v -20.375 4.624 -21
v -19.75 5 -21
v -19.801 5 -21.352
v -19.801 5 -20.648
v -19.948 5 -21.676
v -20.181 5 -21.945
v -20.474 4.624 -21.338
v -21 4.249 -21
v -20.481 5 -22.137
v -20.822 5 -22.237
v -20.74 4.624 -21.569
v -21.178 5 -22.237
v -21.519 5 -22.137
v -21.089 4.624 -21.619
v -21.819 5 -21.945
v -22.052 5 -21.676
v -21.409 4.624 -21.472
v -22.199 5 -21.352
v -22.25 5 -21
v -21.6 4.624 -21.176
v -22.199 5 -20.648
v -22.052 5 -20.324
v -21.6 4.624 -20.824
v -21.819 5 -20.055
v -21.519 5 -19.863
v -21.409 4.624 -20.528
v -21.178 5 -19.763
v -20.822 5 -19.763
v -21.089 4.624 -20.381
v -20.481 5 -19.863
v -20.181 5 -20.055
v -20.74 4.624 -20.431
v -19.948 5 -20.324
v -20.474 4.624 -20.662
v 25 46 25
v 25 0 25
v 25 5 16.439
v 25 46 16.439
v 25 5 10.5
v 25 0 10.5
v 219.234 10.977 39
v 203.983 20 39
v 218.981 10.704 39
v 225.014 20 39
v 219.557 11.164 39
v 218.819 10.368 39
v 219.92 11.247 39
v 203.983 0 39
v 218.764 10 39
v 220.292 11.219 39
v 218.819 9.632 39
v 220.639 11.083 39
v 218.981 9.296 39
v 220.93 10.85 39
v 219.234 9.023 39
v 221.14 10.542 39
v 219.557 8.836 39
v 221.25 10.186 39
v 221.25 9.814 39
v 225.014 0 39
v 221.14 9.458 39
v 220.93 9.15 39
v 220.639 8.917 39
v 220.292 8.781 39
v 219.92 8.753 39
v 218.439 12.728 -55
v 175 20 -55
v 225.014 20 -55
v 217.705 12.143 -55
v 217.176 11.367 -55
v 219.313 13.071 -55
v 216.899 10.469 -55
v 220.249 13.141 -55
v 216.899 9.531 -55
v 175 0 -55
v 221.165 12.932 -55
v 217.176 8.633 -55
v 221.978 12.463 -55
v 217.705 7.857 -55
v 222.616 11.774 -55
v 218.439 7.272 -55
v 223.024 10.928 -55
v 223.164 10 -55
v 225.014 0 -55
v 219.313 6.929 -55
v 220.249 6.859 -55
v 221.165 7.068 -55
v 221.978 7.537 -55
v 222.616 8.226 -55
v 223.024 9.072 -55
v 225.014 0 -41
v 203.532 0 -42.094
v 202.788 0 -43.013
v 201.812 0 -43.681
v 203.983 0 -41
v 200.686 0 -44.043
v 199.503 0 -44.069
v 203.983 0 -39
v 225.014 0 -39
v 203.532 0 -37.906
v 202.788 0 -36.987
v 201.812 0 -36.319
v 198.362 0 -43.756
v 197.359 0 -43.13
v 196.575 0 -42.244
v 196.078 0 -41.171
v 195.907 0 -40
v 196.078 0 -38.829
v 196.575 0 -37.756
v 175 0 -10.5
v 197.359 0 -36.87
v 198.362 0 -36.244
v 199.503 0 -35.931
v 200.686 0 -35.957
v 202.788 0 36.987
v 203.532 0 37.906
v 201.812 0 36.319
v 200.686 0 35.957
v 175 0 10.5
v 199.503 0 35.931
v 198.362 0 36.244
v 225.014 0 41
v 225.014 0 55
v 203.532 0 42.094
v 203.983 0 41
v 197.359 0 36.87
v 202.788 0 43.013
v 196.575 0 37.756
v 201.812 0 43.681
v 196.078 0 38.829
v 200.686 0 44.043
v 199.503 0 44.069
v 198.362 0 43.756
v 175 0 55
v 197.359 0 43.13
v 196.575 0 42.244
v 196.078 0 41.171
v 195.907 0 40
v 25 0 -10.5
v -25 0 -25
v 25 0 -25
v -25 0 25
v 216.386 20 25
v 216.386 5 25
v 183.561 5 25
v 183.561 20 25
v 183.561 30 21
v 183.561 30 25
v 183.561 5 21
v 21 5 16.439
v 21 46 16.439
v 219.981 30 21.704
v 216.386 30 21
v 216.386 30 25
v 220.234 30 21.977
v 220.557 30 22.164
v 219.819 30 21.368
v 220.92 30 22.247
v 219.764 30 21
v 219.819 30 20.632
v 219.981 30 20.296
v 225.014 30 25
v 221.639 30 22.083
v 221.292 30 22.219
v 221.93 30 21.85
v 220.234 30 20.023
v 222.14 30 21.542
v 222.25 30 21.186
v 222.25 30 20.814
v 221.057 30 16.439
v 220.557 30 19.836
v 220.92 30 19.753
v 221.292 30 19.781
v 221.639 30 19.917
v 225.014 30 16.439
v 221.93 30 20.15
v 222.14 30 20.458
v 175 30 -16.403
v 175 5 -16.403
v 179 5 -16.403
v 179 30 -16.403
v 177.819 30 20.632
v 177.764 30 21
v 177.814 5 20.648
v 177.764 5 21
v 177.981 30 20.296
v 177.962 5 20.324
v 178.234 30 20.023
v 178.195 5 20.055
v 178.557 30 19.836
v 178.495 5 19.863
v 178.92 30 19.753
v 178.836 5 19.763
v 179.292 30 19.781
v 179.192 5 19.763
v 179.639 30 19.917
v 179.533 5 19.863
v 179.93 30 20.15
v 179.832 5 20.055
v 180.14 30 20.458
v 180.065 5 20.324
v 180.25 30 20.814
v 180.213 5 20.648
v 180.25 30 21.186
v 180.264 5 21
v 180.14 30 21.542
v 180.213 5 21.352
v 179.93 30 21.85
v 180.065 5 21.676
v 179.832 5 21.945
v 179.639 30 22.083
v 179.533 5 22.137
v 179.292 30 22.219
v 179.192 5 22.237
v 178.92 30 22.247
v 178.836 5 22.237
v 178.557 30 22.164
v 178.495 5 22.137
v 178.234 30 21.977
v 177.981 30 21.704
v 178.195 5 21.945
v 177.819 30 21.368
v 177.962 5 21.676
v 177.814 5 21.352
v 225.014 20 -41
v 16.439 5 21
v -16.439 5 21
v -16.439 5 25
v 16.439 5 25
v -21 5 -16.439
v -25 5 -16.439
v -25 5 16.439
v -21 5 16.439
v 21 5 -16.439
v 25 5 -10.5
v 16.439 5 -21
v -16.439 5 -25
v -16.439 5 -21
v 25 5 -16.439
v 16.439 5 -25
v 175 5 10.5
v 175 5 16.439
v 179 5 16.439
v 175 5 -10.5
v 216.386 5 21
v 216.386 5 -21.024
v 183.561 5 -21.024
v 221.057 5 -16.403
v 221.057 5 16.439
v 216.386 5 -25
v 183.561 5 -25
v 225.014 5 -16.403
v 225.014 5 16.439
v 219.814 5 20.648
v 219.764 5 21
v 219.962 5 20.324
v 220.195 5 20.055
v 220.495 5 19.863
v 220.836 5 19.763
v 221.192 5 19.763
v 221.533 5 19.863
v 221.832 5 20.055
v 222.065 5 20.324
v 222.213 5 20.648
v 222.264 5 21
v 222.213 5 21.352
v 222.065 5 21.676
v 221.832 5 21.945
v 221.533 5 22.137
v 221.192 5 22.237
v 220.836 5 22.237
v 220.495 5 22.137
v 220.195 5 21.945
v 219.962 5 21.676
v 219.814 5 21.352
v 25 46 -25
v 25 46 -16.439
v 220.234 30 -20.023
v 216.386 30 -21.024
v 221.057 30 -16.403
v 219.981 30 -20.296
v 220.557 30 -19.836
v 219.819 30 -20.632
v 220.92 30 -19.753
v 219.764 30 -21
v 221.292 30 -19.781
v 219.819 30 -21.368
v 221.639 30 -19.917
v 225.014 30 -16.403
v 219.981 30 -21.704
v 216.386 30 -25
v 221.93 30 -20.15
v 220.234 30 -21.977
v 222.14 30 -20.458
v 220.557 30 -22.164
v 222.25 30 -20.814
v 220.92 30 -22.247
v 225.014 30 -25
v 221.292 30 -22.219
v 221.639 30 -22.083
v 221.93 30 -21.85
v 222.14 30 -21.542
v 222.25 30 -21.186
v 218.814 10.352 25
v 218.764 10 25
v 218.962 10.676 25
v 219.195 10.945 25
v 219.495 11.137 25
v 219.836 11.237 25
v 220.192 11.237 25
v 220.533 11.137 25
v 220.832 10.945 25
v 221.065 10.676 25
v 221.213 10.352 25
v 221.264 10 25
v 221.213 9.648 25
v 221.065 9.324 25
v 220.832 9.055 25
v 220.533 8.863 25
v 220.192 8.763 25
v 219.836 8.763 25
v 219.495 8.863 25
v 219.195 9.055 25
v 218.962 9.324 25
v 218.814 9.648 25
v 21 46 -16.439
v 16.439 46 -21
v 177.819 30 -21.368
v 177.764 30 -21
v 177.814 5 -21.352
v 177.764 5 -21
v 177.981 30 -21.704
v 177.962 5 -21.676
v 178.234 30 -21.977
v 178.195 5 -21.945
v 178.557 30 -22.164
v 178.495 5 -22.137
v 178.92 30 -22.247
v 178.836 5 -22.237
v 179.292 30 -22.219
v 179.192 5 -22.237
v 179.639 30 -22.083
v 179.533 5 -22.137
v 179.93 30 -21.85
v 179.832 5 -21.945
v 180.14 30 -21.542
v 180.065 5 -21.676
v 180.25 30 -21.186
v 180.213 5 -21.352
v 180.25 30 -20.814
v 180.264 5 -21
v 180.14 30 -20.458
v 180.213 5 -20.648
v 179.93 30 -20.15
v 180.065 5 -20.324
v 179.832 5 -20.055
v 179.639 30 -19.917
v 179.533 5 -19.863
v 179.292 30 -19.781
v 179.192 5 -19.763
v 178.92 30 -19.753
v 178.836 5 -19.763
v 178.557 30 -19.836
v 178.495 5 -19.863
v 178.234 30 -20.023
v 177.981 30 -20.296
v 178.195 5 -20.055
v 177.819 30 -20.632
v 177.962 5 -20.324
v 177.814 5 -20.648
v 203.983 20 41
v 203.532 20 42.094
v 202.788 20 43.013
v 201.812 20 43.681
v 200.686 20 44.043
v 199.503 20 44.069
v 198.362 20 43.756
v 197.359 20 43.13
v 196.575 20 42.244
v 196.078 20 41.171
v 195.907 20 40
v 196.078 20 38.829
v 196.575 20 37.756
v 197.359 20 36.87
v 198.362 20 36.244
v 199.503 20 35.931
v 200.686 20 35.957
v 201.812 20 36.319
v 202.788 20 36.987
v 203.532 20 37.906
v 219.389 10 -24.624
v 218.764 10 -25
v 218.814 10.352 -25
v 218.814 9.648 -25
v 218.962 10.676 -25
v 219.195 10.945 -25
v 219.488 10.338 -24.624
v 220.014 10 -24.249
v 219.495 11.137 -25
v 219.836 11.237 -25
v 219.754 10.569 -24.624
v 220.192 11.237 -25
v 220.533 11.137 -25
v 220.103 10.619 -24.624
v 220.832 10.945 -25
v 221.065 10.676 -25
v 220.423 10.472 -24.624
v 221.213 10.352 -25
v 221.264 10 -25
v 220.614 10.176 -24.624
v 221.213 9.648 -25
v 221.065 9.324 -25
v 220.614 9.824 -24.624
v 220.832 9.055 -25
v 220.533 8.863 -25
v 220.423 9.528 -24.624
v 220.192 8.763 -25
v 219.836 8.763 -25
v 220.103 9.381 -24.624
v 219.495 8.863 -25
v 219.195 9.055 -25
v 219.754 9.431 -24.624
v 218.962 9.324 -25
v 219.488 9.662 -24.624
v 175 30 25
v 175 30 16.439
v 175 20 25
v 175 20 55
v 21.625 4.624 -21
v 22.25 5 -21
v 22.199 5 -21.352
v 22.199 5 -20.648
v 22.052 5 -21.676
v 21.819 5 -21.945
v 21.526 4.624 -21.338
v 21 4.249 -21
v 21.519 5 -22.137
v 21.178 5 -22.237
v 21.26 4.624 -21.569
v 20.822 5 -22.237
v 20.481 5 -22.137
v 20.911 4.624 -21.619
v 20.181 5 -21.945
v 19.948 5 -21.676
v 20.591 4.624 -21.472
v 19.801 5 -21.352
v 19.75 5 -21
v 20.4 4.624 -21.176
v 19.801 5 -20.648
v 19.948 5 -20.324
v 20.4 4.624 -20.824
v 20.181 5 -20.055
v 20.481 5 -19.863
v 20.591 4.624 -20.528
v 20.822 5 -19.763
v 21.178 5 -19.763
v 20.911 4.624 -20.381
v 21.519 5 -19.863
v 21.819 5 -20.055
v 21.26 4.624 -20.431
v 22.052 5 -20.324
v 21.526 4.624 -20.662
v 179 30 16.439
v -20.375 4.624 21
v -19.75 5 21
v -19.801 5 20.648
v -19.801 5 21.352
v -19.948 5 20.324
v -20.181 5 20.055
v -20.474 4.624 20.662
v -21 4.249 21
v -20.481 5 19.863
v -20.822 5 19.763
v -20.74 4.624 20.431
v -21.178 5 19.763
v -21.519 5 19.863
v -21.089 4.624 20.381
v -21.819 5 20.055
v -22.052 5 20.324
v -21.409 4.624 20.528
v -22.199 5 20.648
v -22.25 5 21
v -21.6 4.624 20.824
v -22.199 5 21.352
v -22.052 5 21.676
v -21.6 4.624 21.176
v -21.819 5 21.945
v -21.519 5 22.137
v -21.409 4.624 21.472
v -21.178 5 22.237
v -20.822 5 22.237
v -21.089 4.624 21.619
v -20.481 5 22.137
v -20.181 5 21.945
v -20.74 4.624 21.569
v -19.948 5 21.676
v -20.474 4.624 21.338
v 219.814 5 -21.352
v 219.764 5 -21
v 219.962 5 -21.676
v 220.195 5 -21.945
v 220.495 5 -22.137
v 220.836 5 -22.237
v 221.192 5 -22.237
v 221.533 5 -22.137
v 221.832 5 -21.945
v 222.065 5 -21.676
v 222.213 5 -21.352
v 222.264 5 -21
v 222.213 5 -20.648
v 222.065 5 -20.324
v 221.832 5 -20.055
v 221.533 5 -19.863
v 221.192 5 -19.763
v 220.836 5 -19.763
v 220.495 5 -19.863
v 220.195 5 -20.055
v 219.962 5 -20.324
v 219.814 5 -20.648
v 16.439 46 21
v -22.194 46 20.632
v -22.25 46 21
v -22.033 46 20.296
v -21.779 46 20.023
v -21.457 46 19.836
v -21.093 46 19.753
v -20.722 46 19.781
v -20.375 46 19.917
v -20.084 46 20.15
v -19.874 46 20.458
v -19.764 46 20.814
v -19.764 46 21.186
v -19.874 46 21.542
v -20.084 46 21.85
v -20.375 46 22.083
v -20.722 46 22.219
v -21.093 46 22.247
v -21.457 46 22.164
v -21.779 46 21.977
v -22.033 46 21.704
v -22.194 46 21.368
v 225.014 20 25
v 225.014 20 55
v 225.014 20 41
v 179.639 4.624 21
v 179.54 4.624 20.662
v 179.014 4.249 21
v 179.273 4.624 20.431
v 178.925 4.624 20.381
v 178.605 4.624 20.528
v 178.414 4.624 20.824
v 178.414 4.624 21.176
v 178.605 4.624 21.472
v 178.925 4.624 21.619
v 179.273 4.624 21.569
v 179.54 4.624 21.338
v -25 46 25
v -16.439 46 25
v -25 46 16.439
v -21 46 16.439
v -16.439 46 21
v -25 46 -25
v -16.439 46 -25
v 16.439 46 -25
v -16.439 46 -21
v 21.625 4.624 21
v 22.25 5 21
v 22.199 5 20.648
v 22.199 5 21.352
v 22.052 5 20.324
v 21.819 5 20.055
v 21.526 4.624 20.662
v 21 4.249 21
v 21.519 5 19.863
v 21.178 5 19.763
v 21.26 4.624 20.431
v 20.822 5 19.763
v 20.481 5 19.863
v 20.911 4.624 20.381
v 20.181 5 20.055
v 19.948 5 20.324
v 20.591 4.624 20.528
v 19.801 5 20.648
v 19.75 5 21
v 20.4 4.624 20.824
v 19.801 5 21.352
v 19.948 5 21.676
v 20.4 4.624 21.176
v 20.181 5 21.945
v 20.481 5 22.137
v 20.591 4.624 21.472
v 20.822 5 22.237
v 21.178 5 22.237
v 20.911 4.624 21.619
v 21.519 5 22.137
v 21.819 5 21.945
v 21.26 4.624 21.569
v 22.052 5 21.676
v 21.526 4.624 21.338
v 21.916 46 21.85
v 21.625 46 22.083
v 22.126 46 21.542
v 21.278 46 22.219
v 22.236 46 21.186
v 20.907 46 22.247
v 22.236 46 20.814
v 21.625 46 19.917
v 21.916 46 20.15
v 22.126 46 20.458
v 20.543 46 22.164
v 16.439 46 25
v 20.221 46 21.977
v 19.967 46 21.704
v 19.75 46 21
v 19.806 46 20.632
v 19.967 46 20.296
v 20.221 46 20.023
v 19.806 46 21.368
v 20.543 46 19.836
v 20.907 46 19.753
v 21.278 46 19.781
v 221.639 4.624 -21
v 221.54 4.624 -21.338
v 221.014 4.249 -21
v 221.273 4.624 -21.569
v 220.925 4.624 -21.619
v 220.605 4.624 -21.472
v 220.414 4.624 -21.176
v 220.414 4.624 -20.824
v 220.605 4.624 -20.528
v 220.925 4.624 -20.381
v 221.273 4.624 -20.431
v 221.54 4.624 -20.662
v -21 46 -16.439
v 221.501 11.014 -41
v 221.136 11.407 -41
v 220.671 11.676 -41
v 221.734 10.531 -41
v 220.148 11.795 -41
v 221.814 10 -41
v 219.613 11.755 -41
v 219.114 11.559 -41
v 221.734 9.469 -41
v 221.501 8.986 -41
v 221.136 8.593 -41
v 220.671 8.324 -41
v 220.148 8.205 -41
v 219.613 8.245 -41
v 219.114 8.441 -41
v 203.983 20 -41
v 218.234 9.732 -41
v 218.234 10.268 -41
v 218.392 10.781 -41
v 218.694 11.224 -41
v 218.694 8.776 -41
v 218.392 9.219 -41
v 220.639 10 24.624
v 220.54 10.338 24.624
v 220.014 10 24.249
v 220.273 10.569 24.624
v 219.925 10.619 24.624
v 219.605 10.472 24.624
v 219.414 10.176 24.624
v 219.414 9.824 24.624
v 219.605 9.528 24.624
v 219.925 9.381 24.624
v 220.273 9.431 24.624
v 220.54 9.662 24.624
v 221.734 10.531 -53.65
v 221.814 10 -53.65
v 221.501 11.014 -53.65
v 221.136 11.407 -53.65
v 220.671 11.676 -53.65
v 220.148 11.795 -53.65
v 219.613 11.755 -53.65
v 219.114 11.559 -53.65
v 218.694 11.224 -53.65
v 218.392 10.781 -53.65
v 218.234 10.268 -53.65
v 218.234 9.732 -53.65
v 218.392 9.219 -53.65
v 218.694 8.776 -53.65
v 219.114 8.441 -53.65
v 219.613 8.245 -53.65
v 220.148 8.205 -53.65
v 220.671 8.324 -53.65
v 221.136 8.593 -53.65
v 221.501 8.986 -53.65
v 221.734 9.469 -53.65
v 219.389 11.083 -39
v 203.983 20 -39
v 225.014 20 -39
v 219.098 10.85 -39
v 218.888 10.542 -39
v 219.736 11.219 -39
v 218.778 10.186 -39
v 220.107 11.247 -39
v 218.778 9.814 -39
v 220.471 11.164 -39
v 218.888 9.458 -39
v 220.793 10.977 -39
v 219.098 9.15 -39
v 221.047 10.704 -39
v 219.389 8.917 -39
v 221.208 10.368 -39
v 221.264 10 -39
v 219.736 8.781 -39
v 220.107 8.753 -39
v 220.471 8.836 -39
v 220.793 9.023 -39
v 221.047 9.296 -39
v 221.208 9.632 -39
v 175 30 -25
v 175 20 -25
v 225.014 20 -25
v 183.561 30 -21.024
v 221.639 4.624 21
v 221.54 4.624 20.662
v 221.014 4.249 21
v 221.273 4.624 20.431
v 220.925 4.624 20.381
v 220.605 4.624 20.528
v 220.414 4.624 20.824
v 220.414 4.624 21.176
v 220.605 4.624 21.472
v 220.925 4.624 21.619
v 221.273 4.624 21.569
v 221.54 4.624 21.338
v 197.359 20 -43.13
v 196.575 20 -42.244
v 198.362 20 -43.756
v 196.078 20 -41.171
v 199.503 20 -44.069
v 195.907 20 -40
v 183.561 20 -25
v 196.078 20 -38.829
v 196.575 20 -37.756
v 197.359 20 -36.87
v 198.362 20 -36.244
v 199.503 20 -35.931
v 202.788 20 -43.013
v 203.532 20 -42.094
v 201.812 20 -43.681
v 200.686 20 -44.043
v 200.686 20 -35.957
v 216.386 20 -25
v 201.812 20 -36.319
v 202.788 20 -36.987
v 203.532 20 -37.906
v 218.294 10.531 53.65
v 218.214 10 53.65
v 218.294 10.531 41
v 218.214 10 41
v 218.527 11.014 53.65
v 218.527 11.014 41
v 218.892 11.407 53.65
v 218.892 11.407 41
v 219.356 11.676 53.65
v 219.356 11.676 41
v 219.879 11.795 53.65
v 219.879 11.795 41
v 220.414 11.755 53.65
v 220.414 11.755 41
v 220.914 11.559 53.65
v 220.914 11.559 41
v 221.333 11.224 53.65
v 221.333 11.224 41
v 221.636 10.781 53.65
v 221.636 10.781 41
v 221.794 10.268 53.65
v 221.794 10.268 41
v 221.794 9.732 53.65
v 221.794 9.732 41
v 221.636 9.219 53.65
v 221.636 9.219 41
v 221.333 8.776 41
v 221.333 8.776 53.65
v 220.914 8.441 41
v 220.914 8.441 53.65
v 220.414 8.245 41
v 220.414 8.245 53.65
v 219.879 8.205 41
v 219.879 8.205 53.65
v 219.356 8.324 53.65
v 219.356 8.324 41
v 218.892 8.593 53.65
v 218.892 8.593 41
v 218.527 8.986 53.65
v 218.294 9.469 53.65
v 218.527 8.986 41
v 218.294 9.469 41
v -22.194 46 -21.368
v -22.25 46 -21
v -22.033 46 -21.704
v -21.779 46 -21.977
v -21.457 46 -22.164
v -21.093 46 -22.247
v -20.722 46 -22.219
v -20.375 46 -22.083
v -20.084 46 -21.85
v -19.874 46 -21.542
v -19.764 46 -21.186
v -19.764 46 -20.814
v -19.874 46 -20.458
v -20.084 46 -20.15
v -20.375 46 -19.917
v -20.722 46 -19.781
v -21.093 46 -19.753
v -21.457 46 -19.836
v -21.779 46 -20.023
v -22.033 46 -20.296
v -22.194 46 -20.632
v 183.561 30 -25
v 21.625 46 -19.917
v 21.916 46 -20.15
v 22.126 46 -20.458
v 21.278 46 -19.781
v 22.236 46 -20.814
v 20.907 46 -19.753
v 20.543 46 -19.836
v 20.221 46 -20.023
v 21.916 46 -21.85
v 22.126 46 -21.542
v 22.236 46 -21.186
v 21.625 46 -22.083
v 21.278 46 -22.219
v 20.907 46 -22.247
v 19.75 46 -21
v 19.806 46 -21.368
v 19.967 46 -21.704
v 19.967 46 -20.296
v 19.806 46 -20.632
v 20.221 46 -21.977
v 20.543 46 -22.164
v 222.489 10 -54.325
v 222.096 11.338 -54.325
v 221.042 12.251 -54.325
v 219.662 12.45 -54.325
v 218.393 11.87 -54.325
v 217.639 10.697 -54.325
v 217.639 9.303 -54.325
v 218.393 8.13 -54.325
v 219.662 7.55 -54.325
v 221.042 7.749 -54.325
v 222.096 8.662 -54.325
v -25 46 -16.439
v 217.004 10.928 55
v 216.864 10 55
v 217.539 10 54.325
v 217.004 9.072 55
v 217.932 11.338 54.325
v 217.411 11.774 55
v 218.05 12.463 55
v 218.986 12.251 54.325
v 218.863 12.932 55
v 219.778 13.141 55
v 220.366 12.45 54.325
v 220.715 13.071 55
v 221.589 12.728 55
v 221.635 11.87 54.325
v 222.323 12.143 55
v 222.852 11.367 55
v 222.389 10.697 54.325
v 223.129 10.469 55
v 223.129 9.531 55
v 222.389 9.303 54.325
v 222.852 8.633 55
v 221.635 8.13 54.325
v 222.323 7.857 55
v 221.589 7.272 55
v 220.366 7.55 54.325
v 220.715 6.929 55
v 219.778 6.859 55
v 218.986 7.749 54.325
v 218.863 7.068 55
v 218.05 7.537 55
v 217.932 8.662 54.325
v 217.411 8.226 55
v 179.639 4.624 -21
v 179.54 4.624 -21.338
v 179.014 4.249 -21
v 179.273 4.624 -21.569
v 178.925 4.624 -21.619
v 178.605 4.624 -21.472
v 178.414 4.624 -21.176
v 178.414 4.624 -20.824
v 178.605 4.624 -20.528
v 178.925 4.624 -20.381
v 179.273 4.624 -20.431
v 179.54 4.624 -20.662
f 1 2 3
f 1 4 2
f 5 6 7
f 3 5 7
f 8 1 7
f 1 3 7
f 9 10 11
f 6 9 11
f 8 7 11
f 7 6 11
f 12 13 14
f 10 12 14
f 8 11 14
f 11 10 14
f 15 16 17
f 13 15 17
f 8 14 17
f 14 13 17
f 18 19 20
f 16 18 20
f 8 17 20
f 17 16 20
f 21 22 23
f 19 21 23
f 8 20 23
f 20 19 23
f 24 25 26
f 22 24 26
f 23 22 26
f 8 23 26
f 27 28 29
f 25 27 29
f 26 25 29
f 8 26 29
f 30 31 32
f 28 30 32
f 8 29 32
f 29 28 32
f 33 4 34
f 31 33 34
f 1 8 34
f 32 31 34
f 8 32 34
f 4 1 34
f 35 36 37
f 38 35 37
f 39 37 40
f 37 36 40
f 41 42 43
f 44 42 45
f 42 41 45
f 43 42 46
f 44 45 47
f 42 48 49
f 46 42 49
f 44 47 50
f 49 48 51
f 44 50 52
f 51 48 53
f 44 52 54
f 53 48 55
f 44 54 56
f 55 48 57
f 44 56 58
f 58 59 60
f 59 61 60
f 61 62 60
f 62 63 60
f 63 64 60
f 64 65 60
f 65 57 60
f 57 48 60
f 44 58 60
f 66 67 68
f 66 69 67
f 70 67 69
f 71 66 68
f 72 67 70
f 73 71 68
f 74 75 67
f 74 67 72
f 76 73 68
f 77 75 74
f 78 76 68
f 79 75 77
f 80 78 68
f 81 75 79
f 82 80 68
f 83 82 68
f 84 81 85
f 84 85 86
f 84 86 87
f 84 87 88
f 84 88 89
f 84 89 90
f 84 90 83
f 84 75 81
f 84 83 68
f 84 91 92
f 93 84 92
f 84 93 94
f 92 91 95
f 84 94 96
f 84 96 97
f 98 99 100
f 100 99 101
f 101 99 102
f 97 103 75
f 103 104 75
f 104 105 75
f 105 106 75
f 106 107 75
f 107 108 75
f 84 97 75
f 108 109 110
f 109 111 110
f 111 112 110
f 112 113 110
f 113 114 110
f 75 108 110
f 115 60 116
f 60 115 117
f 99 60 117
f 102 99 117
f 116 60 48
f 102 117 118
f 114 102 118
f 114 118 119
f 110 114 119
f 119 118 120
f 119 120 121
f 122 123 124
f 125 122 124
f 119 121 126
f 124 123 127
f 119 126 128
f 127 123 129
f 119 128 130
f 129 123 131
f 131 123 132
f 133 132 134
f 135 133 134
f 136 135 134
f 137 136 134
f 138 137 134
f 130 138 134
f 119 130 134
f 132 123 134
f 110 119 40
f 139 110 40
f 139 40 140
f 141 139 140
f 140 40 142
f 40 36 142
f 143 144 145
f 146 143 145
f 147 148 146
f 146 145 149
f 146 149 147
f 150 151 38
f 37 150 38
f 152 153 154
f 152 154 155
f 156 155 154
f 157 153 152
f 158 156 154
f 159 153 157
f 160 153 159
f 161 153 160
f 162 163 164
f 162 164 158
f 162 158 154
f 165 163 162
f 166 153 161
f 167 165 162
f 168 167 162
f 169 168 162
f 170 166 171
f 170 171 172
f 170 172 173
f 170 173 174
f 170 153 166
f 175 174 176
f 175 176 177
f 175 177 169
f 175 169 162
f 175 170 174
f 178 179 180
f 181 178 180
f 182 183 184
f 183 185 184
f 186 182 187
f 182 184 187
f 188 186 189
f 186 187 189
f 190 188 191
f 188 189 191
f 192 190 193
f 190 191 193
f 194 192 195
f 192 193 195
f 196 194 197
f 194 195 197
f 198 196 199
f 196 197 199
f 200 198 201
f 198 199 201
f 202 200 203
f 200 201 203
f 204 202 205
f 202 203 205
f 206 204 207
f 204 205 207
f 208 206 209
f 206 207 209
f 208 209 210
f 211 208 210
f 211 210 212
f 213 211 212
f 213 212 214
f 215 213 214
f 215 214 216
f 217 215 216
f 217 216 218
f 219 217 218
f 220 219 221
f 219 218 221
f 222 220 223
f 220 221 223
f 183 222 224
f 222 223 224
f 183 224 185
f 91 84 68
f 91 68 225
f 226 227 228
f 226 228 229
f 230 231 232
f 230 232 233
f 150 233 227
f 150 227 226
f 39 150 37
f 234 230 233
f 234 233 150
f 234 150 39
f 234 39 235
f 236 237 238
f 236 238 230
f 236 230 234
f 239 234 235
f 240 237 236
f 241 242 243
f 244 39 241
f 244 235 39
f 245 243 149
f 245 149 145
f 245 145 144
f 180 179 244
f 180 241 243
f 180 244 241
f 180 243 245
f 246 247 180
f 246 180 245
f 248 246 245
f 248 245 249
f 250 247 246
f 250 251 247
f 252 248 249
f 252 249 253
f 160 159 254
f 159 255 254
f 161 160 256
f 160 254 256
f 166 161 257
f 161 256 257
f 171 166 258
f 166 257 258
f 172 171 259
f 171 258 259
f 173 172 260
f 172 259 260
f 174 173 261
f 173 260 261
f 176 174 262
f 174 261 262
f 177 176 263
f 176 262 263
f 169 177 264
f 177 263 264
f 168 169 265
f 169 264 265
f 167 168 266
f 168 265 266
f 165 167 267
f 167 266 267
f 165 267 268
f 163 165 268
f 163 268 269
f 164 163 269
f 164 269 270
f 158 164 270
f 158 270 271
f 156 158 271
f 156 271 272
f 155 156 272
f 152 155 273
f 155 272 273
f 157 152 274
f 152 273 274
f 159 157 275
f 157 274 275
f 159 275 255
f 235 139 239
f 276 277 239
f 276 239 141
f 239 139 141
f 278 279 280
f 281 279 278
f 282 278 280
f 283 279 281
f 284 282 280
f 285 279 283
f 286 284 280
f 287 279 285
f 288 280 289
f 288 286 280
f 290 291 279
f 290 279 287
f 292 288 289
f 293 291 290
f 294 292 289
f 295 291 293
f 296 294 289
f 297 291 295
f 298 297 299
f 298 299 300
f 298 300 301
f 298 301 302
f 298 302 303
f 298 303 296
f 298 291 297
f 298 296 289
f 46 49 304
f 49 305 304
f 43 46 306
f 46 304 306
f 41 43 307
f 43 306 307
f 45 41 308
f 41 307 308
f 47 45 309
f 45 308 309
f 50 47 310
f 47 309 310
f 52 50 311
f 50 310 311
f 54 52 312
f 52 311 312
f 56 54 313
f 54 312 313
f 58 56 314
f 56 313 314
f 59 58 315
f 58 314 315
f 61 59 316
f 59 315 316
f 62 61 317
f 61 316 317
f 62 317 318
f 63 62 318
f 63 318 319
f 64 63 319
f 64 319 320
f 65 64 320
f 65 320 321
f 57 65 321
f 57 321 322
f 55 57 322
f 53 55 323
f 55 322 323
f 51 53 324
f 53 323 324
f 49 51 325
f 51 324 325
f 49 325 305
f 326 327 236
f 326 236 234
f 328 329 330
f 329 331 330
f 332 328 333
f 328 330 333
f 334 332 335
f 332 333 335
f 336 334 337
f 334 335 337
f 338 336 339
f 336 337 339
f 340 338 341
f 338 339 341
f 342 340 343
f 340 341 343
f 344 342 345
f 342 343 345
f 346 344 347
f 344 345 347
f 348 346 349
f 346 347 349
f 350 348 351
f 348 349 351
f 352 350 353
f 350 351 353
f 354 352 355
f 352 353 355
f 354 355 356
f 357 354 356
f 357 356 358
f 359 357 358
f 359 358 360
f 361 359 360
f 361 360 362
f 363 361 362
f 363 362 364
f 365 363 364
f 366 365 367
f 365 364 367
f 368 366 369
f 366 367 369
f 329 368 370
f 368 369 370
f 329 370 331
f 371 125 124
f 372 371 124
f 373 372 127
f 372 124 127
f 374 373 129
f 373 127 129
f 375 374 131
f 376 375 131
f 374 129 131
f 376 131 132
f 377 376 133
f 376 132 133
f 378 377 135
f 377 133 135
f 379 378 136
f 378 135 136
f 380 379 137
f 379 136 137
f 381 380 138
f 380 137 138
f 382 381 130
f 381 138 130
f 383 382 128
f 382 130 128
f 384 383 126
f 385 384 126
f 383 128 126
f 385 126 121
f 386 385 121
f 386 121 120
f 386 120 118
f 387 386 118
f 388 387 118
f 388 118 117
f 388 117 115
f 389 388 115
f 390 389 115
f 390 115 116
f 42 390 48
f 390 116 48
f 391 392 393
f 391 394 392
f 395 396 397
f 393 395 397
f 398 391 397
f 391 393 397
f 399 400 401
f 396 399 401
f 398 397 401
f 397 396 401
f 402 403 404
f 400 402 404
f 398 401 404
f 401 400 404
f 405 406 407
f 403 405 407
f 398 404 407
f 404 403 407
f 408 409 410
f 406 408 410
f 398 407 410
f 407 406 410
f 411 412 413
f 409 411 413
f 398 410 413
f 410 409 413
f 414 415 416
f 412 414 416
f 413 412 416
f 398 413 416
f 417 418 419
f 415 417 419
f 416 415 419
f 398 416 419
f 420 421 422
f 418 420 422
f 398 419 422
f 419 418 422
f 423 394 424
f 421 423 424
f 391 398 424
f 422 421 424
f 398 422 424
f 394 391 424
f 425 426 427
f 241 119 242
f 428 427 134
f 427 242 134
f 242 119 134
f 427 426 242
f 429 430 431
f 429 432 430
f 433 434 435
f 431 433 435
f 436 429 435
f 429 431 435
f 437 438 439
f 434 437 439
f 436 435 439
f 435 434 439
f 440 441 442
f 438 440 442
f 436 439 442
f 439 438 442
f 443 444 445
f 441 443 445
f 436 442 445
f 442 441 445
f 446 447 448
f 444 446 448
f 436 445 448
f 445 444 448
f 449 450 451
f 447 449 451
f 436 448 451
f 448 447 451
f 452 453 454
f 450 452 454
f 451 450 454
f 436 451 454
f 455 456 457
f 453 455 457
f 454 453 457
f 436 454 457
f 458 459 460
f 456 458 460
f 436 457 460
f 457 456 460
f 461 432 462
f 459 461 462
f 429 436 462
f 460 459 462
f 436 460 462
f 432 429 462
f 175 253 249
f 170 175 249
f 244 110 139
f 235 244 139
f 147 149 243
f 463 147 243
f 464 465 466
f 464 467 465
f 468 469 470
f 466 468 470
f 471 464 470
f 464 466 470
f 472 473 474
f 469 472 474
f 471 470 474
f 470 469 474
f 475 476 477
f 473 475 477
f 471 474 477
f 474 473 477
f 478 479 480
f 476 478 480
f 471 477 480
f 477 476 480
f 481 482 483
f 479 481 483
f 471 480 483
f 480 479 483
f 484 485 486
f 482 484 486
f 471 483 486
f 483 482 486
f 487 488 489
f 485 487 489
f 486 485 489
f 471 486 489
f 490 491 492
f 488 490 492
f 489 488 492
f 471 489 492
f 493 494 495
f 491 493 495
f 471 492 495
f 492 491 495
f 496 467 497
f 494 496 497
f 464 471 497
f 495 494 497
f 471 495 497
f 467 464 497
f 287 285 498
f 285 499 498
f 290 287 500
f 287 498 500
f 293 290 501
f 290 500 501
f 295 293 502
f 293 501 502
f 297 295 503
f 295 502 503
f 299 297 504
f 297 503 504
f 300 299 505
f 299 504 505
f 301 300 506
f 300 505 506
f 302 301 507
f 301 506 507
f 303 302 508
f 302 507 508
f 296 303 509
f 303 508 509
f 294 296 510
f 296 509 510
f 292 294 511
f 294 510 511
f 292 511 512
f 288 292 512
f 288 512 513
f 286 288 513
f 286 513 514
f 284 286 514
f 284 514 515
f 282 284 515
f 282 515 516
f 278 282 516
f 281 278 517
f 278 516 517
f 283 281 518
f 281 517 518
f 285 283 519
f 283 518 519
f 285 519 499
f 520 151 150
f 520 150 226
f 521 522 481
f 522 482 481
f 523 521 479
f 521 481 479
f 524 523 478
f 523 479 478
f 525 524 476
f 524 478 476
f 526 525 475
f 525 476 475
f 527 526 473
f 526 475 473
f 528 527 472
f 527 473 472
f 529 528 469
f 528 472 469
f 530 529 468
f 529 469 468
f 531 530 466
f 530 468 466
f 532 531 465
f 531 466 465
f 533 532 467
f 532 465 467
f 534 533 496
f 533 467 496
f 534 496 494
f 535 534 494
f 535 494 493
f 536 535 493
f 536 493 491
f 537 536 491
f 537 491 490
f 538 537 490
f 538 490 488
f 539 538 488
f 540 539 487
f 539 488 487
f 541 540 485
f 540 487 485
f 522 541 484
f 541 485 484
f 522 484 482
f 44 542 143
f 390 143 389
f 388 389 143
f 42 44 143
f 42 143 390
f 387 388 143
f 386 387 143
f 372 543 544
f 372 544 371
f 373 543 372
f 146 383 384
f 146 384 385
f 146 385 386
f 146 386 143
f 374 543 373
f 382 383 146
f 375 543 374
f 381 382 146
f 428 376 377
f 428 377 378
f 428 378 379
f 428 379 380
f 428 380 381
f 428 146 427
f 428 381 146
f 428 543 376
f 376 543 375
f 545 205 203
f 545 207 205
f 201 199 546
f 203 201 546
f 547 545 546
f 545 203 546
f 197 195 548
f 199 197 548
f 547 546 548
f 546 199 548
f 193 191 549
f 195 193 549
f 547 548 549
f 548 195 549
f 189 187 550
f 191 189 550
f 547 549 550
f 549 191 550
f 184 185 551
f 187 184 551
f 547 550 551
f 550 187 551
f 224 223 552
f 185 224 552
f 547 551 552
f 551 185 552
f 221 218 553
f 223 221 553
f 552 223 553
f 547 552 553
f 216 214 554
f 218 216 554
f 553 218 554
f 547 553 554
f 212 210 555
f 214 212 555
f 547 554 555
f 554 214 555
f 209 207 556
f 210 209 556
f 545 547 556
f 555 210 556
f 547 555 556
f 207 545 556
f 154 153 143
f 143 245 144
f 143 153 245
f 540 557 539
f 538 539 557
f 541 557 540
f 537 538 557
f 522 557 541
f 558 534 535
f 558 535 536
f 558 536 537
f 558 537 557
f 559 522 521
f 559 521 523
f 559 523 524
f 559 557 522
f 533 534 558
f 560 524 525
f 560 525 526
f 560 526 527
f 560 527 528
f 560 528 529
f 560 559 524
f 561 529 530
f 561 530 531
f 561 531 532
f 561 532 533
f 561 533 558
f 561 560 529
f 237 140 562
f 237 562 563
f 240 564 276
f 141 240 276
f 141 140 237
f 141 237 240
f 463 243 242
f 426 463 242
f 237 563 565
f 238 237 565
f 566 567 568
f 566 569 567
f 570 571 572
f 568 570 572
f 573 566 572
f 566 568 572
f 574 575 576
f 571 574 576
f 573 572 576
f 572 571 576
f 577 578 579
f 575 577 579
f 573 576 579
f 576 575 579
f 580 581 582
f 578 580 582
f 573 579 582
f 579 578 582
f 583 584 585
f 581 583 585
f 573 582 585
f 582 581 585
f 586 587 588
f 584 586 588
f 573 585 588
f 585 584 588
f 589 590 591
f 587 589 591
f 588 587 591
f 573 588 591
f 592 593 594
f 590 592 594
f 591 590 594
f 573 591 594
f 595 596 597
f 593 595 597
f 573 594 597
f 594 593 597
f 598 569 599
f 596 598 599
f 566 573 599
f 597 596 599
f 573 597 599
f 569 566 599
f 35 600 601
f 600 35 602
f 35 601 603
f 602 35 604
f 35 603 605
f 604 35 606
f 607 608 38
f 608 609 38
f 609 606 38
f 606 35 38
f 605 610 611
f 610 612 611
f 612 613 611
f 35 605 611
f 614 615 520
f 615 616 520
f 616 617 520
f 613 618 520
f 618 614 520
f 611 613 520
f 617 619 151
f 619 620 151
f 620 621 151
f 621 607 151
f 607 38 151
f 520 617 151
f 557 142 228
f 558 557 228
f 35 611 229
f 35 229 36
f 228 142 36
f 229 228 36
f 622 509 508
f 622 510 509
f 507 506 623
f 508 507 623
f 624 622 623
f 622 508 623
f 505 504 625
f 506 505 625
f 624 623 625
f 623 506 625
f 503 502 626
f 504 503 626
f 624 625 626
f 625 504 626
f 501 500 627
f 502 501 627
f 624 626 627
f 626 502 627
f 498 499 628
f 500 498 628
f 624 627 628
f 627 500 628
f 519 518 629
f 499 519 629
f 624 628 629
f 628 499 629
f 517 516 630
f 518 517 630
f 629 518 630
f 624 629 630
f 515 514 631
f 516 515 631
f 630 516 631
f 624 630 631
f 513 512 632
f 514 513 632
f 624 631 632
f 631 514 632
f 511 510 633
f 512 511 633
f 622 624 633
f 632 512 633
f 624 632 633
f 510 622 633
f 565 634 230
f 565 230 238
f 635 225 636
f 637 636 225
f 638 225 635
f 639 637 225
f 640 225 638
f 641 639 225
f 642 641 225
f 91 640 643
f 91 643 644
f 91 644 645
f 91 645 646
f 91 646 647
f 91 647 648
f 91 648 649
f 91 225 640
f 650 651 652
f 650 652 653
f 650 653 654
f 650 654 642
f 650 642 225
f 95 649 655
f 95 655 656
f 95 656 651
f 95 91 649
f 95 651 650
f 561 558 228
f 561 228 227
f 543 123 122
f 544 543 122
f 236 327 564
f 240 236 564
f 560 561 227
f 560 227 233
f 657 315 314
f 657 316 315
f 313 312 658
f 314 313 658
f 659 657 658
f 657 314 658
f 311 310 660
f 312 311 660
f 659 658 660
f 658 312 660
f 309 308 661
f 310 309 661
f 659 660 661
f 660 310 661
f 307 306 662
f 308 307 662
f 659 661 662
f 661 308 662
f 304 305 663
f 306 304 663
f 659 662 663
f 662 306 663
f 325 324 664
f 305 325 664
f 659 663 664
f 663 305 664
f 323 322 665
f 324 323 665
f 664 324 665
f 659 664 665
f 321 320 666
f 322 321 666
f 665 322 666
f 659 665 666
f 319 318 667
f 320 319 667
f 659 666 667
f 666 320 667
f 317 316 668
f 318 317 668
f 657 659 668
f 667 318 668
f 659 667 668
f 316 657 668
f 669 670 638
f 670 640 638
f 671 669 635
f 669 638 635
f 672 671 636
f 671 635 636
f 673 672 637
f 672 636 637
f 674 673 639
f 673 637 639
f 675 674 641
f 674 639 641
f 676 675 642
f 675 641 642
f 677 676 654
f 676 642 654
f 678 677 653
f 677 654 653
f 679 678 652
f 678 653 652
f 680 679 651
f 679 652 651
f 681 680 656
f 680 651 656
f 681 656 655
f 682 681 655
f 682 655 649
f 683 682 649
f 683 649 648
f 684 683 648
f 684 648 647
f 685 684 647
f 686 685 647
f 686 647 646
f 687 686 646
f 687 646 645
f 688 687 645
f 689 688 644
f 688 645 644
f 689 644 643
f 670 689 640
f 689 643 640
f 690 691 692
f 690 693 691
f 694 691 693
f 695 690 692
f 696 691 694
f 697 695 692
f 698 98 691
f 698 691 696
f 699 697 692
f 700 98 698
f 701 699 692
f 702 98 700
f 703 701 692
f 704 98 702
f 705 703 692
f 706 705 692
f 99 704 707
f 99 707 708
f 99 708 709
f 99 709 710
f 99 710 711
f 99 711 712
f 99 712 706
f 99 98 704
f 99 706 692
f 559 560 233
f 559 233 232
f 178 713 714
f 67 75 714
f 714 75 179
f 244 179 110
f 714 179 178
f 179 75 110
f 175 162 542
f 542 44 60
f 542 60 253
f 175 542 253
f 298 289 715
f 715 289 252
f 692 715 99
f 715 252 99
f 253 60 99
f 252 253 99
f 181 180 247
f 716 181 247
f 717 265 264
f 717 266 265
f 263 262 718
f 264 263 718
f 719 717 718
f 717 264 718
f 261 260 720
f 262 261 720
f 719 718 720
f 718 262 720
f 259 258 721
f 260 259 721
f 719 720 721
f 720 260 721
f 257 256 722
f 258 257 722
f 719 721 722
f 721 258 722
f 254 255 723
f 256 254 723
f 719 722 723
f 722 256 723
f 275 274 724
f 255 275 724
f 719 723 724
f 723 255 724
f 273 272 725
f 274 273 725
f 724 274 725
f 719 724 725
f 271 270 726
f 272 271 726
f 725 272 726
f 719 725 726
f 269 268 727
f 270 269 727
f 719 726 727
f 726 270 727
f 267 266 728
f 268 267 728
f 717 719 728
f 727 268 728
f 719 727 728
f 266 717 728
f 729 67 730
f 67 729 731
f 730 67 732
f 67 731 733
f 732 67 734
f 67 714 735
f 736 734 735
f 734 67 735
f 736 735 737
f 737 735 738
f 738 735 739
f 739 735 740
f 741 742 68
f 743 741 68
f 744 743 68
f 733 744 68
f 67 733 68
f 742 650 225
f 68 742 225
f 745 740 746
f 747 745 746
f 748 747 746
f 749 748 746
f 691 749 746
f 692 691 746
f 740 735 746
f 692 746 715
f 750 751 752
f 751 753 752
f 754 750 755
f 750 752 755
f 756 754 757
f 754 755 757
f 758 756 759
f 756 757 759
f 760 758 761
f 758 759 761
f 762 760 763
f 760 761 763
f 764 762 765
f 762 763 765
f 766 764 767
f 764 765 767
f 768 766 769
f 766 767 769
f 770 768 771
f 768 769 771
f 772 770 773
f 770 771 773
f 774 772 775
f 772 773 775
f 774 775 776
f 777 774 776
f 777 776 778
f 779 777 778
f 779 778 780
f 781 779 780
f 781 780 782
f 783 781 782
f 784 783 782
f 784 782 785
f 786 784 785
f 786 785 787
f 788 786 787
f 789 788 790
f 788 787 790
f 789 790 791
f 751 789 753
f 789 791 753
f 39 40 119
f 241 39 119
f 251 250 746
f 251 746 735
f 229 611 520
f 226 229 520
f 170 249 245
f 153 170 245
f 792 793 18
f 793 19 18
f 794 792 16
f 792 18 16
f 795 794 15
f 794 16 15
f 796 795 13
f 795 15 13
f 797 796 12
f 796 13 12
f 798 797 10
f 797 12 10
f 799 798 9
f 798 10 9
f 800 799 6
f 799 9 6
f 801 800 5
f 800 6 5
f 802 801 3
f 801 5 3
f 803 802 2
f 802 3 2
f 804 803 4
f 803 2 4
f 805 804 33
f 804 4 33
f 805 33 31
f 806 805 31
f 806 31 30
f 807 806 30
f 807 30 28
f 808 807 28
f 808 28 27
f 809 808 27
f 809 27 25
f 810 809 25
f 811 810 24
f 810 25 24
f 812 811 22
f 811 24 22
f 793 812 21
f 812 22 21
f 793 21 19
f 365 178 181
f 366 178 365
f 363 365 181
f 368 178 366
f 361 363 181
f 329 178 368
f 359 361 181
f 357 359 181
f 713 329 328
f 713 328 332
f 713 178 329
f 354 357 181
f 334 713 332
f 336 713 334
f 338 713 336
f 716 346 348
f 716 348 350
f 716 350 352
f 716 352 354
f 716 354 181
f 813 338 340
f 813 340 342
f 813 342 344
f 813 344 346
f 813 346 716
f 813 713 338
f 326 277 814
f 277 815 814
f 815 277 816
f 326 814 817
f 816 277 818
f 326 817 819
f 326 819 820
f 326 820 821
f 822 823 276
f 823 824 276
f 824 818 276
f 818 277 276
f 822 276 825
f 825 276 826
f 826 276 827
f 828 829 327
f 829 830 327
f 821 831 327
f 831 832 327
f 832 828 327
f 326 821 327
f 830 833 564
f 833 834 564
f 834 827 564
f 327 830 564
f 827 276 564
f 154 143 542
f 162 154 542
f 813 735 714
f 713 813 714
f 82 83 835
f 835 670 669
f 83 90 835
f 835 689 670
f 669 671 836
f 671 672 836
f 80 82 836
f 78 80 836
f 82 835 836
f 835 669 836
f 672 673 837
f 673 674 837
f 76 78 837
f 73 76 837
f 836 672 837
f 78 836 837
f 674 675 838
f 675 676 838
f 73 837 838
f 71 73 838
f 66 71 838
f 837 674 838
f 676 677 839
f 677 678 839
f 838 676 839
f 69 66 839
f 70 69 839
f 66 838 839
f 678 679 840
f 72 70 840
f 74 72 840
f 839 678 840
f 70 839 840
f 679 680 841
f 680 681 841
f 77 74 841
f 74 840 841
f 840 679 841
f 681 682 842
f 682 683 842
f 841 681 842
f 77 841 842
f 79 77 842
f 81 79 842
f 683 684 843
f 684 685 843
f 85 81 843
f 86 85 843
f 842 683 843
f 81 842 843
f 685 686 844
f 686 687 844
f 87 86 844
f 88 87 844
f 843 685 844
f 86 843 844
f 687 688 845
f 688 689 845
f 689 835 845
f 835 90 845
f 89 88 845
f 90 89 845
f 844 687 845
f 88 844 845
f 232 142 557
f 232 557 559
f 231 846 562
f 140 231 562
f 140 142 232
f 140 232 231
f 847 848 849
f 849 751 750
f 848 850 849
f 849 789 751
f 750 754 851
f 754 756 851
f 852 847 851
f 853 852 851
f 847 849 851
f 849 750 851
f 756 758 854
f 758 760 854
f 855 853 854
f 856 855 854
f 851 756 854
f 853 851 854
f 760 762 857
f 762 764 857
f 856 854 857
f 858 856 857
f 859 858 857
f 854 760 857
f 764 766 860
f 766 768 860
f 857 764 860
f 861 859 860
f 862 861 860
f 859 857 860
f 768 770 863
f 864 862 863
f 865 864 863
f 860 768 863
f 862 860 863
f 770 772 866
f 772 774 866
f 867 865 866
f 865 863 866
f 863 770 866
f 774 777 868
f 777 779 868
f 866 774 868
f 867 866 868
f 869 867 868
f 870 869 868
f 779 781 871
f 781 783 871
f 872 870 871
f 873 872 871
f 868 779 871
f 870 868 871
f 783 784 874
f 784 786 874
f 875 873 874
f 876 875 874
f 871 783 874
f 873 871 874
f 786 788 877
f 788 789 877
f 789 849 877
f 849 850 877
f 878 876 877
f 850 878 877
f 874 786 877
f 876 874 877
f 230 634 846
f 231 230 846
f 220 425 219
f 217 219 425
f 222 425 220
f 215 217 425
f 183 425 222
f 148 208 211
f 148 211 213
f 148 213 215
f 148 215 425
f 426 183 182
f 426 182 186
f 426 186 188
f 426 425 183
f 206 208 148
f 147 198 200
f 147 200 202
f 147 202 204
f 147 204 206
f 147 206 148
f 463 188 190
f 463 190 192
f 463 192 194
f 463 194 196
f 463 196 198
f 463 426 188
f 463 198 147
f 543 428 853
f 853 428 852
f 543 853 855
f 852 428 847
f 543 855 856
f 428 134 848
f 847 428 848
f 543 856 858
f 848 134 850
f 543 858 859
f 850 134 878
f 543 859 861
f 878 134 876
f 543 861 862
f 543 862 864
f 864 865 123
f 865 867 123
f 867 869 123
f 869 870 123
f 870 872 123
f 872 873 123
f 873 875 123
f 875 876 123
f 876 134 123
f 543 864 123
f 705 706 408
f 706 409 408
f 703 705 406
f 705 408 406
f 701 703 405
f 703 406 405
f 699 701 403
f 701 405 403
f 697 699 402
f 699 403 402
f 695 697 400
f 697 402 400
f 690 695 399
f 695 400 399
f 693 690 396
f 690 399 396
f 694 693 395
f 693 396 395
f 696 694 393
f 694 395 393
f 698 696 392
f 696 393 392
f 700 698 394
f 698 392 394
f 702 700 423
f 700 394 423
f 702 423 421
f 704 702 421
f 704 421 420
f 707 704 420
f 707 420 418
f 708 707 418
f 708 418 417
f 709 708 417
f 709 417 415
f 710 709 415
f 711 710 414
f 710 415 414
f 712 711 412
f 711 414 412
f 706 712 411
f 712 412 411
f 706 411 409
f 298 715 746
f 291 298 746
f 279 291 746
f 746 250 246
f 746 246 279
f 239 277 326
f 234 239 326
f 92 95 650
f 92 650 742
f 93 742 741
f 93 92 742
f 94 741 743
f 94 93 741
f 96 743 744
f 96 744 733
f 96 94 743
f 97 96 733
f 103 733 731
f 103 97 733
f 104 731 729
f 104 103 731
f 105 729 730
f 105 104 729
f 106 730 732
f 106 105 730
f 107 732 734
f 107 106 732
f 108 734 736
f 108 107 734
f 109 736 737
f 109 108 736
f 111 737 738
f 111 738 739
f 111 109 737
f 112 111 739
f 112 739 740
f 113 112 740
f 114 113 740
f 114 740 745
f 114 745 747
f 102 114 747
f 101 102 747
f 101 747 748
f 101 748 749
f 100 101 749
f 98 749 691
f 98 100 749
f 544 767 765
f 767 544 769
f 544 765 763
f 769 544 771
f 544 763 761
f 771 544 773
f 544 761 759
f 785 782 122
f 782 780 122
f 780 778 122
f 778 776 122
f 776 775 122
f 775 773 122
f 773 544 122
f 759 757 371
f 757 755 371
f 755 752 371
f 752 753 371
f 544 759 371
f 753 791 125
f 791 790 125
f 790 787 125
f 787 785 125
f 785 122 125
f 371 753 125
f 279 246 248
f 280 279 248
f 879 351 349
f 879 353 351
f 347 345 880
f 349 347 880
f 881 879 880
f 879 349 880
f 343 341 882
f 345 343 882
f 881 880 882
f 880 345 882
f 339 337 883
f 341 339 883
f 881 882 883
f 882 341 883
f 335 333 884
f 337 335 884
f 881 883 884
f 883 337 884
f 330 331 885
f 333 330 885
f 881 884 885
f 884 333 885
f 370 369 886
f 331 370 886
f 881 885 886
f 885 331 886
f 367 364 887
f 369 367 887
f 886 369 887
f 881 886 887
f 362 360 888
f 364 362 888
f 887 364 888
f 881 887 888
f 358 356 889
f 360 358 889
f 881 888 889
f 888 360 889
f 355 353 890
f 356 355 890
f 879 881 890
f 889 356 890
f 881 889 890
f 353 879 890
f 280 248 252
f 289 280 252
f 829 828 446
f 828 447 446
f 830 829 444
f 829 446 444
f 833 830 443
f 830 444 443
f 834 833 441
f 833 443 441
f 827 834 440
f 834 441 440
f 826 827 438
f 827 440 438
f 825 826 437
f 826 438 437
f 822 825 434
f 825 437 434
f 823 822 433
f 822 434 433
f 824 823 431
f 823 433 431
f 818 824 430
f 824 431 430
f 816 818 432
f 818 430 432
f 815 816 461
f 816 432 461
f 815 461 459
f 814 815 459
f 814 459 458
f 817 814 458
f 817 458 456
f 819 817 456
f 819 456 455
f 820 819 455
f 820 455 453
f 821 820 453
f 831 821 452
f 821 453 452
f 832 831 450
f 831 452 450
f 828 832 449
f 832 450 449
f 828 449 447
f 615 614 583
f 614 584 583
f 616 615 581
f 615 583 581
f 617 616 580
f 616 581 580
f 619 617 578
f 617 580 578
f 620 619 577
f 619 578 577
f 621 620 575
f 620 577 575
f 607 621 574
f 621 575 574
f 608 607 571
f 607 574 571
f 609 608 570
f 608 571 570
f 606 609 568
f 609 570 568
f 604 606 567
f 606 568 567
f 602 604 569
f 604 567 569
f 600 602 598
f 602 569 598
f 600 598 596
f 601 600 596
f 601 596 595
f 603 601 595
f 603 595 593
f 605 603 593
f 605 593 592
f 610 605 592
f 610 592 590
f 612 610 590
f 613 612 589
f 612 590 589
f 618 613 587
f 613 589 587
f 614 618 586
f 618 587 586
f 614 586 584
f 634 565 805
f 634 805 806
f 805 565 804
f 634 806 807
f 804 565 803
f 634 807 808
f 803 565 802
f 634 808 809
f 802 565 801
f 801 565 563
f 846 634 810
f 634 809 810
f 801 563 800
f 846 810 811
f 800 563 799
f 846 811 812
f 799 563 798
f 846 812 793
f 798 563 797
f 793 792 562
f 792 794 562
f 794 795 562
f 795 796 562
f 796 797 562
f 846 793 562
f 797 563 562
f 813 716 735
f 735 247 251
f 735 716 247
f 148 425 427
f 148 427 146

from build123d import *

# Parameters (mm, degrees)
BASE_EXTR_DEPTH                                 = 5
MOTOR_1_EXTR_DEPTH                              = 41
SHAFT_MOTOR_SUPPORT_EXTR_DEPTH                  = 25
TAP_DRILL_FOR_M3X0_5_TAP1_D                     = 2.5
TAP_DRILL_FOR_M3X0_5_TAP1_DEPTH                 = 41
TAP_DRILL_FOR_M3X0_5_TAP1_TIP                   = 0.751075774
BOSS_EXTRUDE10_DEPTH                            = 20
CSK_FOR_M3_OVAL_HEAD_MACHINE_SCREW1_D           = 3.6
CSK_FOR_M3_OVAL_HEAD_MACHINE_SCREW1_DEPTH       = 14
CSK_FOR_M3_OVAL_HEAD_MACHINE_SCREW1_CSINK_D     = 6.3
CSK_FOR_M3_OVAL_HEAD_MACHINE_SCREW1_CSINK_ANGLE = 90
CSK_FOR_M3_OVAL_HEAD_MACHINE_SCREW1_TIP         = 1.081549114
CSK_FOR_M3_OVAL_HEAD_MACHINE_SCREW2_D           = 3.6
CSK_FOR_M3_OVAL_HEAD_MACHINE_SCREW2_DEPTH       = 14
CSK_FOR_M3_OVAL_HEAD_MACHINE_SCREW2_CSINK_D     = 6.3
CSK_FOR_M3_OVAL_HEAD_MACHINE_SCREW2_CSINK_ANGLE = 90
CSK_FOR_M3_OVAL_HEAD_MACHINE_SCREW2_TIP         = 1.081549114
TAP_DRILL_FOR_M3X0_5_TAP2_D                     = 2.5
TAP_DRILL_FOR_M3X0_5_TAP2_DEPTH                 = 14
TAP_DRILL_FOR_M3X0_5_TAP2_TIP                   = 0.751075774
TAP_DRILL_FOR_M3X0_5_TAP3_D                     = 2.5
TAP_DRILL_FOR_M3X0_5_TAP3_DEPTH                 = 14
TAP_DRILL_FOR_M3X0_5_TAP3_TIP                   = 0.751075774


with BuildPart() as part:
    # Base_sch → base_extr (new body)
    with BuildSketch(Plane(origin=(0, 0, 0), x_dir=(1, 0, 0), z_dir=(0, 1, 0))):
        Polygon((25, 10.5), (25, 25), (-25, 25), (-25, -25), (25, -25), (25, -10.5), (175, -10.5), (175, -25), (225.013827764, -25), (225.013827764, 25), (175, 25), (175, 10.5), align=None)
    extrude(amount=BASE_EXTR_DEPTH)

    # motor_support_sch → Motor_1_extr (add)
    with BuildSketch(Plane(origin=(0, 5, 0), x_dir=(1, 0, 0), z_dir=(0, 1, 0))):
        Polygon((-25, 16.439389634), (-25, 25), (-16.439389634, 25), (-16.439389634, 21), (-18.719694817, 18.719694817), (-21, 16.439389634), align=None)
        Polygon((16.439389634, 25), (25, 25), (25, 16.439389634), (21, 16.439389634), (18.719694817, 18.719694817), (16.439389634, 21), align=None)
        Polygon((25, -16.439389634), (25, -25), (16.439389634, -25), (16.439389634, -21), (18.719694817, -18.719694817), (21, -16.439389634), align=None)
        Polygon((-18.719694817, -18.719694817), (-21, -16.439389634), (-25, -16.439389634), (-25, -25), (-16.439389634, -25), (-16.439389634, -21), align=None)
    extrude(amount=MOTOR_1_EXTR_DEPTH)

    # shaft_motor_support_sch → shaft_motor_support_extr (add)
    with BuildSketch(Plane(origin=(0, 5, 0), x_dir=(1, 0, 0), z_dir=(0, 1, 0))):
        Polygon((181.280305183, -18.719694817), (179, -16.439389634), (175, -16.439389634), (175, -25), (183.560610366, -25), (183.560610366, -21), align=None)
        Polygon((175, 25), (175, 16.402508948), (179, 16.402508948), (183.560610366, 21.024047525), (183.560610366, 25), align=None)
        Polygon((225.013827764, -25), (225.013827764, -16.439389634), (221.056642929, -16.439389634), (216.38573482, -21), (216.38573482, -25), align=None)
        Polygon((225.013827764, 25), (216.38573482, 25), (216.38573482, 21.024047525), (221.056642929, 16.402508948), (225.013827764, 16.402508948), align=None)
    extrude(amount=SHAFT_MOTOR_SUPPORT_EXTR_DEPTH)

    # Tap Drill for M3x0.5 Tap1
    with Locations(Plane(origin=(0, 46, 0), x_dir=(1, 0, 0), z_dir=(0, 1, 0))):
        with Locations((-21, -21), (21, -21), (21, 21), (-21, 21), (179.013827764, 21), (221.013827764, 21), (221.013827764, -21), (179.013827764, -21)):
            Hole(TAP_DRILL_FOR_M3X0_5_TAP1_D / 2, depth=TAP_DRILL_FOR_M3X0_5_TAP1_DEPTH)
            with Locations((0, 0, -(TAP_DRILL_FOR_M3X0_5_TAP1_DEPTH + TAP_DRILL_FOR_M3X0_5_TAP1_TIP / 2))):  # 118° drill point
                Cone(0, TAP_DRILL_FOR_M3X0_5_TAP1_D / 2, TAP_DRILL_FOR_M3X0_5_TAP1_TIP, mode=Mode.SUBTRACT)

    # Sketch12 → Boss-Extrude10 (add)
    with BuildSketch(Plane.XZ):
        with BuildLine():
            Line((175, 25), (175, 55))
            Line((175, 55), (225.013827764, 55))
            Line((225.013827764, 55), (225.013827764, 41))
            Line((225.013827764, 41), (203.983092952, 41))
            ThreePointArc((203.983092952, 41), (195.906913882, 40), (203.983092952, 39))
            Line((203.983092952, 39), (225.013827764, 39))
            Line((225.013827764, 39), (225.013827764, 25))
            Line((225.013827764, 25), (175, 25))
        make_face()
        with BuildLine():
            Line((175, -25), (175, -55))
            Line((175, -55), (225.013827764, -55))
            Line((225.013827764, -55), (225.013827764, -41))
            Line((225.013827764, -41), (203.983092952, -41))
            ThreePointArc((203.983092952, -41), (195.906913882, -40), (203.983092952, -39))
            Line((203.983092952, -39), (225.013827764, -39))
            Line((225.013827764, -39), (225.013827764, -25))
            Line((225.013827764, -25), (175, -25))
        make_face()
    extrude(amount=-BOSS_EXTRUDE10_DEPTH)

    # CSK for M3 Oval Head Machine Screw1
    with Locations(Plane(origin=(220.013827764, 10, 55), x_dir=(1, 0, 0), z_dir=(0, 0, 1))):
        with Locations((0, 0)):
            CounterSinkHole(CSK_FOR_M3_OVAL_HEAD_MACHINE_SCREW1_D / 2, CSK_FOR_M3_OVAL_HEAD_MACHINE_SCREW1_CSINK_D / 2, depth=CSK_FOR_M3_OVAL_HEAD_MACHINE_SCREW1_DEPTH, counter_sink_angle=CSK_FOR_M3_OVAL_HEAD_MACHINE_SCREW1_CSINK_ANGLE)
            with Locations((0, 0, -(CSK_FOR_M3_OVAL_HEAD_MACHINE_SCREW1_DEPTH + CSK_FOR_M3_OVAL_HEAD_MACHINE_SCREW1_TIP / 2))):  # 118° drill point
                Cone(0, CSK_FOR_M3_OVAL_HEAD_MACHINE_SCREW1_D / 2, CSK_FOR_M3_OVAL_HEAD_MACHINE_SCREW1_TIP, mode=Mode.SUBTRACT)

    # CSK for M3 Oval Head Machine Screw2
    with Locations(Plane(origin=(220.013827764, 10, -55), x_dir=(-1, 0, 0), z_dir=(0, 0, -1))):
        with Locations((0, 0)):
            CounterSinkHole(CSK_FOR_M3_OVAL_HEAD_MACHINE_SCREW2_D / 2, CSK_FOR_M3_OVAL_HEAD_MACHINE_SCREW2_CSINK_D / 2, depth=CSK_FOR_M3_OVAL_HEAD_MACHINE_SCREW2_DEPTH, counter_sink_angle=CSK_FOR_M3_OVAL_HEAD_MACHINE_SCREW2_CSINK_ANGLE)
            with Locations((0, 0, -(CSK_FOR_M3_OVAL_HEAD_MACHINE_SCREW2_DEPTH + CSK_FOR_M3_OVAL_HEAD_MACHINE_SCREW2_TIP / 2))):  # 118° drill point
                Cone(0, CSK_FOR_M3_OVAL_HEAD_MACHINE_SCREW2_D / 2, CSK_FOR_M3_OVAL_HEAD_MACHINE_SCREW2_TIP, mode=Mode.SUBTRACT)

    # Tap Drill for M3x0.5 Tap2
    with Locations(Plane(origin=(0, 0, -39), x_dir=(-1, 0, 0), z_dir=(0, 0, -1))):
        with Locations((-220.013827764, 10)):
            Hole(TAP_DRILL_FOR_M3X0_5_TAP2_D / 2, depth=TAP_DRILL_FOR_M3X0_5_TAP2_DEPTH)
            with Locations((0, 0, -(TAP_DRILL_FOR_M3X0_5_TAP2_DEPTH + TAP_DRILL_FOR_M3X0_5_TAP2_TIP / 2))):  # 118° drill point
                Cone(0, TAP_DRILL_FOR_M3X0_5_TAP2_D / 2, TAP_DRILL_FOR_M3X0_5_TAP2_TIP, mode=Mode.SUBTRACT)

    # Tap Drill for M3x0.5 Tap3
    with Locations(Plane.XY.offset(39)):
        with Locations((220.013827764, 10)):
            Hole(TAP_DRILL_FOR_M3X0_5_TAP3_D / 2, depth=TAP_DRILL_FOR_M3X0_5_TAP3_DEPTH)
            with Locations((0, 0, -(TAP_DRILL_FOR_M3X0_5_TAP3_DEPTH + TAP_DRILL_FOR_M3X0_5_TAP3_TIP / 2))):  # 118° drill point
                Cone(0, TAP_DRILL_FOR_M3X0_5_TAP3_D / 2, TAP_DRILL_FOR_M3X0_5_TAP3_TIP, mode=Mode.SUBTRACT)


solid = part.part
